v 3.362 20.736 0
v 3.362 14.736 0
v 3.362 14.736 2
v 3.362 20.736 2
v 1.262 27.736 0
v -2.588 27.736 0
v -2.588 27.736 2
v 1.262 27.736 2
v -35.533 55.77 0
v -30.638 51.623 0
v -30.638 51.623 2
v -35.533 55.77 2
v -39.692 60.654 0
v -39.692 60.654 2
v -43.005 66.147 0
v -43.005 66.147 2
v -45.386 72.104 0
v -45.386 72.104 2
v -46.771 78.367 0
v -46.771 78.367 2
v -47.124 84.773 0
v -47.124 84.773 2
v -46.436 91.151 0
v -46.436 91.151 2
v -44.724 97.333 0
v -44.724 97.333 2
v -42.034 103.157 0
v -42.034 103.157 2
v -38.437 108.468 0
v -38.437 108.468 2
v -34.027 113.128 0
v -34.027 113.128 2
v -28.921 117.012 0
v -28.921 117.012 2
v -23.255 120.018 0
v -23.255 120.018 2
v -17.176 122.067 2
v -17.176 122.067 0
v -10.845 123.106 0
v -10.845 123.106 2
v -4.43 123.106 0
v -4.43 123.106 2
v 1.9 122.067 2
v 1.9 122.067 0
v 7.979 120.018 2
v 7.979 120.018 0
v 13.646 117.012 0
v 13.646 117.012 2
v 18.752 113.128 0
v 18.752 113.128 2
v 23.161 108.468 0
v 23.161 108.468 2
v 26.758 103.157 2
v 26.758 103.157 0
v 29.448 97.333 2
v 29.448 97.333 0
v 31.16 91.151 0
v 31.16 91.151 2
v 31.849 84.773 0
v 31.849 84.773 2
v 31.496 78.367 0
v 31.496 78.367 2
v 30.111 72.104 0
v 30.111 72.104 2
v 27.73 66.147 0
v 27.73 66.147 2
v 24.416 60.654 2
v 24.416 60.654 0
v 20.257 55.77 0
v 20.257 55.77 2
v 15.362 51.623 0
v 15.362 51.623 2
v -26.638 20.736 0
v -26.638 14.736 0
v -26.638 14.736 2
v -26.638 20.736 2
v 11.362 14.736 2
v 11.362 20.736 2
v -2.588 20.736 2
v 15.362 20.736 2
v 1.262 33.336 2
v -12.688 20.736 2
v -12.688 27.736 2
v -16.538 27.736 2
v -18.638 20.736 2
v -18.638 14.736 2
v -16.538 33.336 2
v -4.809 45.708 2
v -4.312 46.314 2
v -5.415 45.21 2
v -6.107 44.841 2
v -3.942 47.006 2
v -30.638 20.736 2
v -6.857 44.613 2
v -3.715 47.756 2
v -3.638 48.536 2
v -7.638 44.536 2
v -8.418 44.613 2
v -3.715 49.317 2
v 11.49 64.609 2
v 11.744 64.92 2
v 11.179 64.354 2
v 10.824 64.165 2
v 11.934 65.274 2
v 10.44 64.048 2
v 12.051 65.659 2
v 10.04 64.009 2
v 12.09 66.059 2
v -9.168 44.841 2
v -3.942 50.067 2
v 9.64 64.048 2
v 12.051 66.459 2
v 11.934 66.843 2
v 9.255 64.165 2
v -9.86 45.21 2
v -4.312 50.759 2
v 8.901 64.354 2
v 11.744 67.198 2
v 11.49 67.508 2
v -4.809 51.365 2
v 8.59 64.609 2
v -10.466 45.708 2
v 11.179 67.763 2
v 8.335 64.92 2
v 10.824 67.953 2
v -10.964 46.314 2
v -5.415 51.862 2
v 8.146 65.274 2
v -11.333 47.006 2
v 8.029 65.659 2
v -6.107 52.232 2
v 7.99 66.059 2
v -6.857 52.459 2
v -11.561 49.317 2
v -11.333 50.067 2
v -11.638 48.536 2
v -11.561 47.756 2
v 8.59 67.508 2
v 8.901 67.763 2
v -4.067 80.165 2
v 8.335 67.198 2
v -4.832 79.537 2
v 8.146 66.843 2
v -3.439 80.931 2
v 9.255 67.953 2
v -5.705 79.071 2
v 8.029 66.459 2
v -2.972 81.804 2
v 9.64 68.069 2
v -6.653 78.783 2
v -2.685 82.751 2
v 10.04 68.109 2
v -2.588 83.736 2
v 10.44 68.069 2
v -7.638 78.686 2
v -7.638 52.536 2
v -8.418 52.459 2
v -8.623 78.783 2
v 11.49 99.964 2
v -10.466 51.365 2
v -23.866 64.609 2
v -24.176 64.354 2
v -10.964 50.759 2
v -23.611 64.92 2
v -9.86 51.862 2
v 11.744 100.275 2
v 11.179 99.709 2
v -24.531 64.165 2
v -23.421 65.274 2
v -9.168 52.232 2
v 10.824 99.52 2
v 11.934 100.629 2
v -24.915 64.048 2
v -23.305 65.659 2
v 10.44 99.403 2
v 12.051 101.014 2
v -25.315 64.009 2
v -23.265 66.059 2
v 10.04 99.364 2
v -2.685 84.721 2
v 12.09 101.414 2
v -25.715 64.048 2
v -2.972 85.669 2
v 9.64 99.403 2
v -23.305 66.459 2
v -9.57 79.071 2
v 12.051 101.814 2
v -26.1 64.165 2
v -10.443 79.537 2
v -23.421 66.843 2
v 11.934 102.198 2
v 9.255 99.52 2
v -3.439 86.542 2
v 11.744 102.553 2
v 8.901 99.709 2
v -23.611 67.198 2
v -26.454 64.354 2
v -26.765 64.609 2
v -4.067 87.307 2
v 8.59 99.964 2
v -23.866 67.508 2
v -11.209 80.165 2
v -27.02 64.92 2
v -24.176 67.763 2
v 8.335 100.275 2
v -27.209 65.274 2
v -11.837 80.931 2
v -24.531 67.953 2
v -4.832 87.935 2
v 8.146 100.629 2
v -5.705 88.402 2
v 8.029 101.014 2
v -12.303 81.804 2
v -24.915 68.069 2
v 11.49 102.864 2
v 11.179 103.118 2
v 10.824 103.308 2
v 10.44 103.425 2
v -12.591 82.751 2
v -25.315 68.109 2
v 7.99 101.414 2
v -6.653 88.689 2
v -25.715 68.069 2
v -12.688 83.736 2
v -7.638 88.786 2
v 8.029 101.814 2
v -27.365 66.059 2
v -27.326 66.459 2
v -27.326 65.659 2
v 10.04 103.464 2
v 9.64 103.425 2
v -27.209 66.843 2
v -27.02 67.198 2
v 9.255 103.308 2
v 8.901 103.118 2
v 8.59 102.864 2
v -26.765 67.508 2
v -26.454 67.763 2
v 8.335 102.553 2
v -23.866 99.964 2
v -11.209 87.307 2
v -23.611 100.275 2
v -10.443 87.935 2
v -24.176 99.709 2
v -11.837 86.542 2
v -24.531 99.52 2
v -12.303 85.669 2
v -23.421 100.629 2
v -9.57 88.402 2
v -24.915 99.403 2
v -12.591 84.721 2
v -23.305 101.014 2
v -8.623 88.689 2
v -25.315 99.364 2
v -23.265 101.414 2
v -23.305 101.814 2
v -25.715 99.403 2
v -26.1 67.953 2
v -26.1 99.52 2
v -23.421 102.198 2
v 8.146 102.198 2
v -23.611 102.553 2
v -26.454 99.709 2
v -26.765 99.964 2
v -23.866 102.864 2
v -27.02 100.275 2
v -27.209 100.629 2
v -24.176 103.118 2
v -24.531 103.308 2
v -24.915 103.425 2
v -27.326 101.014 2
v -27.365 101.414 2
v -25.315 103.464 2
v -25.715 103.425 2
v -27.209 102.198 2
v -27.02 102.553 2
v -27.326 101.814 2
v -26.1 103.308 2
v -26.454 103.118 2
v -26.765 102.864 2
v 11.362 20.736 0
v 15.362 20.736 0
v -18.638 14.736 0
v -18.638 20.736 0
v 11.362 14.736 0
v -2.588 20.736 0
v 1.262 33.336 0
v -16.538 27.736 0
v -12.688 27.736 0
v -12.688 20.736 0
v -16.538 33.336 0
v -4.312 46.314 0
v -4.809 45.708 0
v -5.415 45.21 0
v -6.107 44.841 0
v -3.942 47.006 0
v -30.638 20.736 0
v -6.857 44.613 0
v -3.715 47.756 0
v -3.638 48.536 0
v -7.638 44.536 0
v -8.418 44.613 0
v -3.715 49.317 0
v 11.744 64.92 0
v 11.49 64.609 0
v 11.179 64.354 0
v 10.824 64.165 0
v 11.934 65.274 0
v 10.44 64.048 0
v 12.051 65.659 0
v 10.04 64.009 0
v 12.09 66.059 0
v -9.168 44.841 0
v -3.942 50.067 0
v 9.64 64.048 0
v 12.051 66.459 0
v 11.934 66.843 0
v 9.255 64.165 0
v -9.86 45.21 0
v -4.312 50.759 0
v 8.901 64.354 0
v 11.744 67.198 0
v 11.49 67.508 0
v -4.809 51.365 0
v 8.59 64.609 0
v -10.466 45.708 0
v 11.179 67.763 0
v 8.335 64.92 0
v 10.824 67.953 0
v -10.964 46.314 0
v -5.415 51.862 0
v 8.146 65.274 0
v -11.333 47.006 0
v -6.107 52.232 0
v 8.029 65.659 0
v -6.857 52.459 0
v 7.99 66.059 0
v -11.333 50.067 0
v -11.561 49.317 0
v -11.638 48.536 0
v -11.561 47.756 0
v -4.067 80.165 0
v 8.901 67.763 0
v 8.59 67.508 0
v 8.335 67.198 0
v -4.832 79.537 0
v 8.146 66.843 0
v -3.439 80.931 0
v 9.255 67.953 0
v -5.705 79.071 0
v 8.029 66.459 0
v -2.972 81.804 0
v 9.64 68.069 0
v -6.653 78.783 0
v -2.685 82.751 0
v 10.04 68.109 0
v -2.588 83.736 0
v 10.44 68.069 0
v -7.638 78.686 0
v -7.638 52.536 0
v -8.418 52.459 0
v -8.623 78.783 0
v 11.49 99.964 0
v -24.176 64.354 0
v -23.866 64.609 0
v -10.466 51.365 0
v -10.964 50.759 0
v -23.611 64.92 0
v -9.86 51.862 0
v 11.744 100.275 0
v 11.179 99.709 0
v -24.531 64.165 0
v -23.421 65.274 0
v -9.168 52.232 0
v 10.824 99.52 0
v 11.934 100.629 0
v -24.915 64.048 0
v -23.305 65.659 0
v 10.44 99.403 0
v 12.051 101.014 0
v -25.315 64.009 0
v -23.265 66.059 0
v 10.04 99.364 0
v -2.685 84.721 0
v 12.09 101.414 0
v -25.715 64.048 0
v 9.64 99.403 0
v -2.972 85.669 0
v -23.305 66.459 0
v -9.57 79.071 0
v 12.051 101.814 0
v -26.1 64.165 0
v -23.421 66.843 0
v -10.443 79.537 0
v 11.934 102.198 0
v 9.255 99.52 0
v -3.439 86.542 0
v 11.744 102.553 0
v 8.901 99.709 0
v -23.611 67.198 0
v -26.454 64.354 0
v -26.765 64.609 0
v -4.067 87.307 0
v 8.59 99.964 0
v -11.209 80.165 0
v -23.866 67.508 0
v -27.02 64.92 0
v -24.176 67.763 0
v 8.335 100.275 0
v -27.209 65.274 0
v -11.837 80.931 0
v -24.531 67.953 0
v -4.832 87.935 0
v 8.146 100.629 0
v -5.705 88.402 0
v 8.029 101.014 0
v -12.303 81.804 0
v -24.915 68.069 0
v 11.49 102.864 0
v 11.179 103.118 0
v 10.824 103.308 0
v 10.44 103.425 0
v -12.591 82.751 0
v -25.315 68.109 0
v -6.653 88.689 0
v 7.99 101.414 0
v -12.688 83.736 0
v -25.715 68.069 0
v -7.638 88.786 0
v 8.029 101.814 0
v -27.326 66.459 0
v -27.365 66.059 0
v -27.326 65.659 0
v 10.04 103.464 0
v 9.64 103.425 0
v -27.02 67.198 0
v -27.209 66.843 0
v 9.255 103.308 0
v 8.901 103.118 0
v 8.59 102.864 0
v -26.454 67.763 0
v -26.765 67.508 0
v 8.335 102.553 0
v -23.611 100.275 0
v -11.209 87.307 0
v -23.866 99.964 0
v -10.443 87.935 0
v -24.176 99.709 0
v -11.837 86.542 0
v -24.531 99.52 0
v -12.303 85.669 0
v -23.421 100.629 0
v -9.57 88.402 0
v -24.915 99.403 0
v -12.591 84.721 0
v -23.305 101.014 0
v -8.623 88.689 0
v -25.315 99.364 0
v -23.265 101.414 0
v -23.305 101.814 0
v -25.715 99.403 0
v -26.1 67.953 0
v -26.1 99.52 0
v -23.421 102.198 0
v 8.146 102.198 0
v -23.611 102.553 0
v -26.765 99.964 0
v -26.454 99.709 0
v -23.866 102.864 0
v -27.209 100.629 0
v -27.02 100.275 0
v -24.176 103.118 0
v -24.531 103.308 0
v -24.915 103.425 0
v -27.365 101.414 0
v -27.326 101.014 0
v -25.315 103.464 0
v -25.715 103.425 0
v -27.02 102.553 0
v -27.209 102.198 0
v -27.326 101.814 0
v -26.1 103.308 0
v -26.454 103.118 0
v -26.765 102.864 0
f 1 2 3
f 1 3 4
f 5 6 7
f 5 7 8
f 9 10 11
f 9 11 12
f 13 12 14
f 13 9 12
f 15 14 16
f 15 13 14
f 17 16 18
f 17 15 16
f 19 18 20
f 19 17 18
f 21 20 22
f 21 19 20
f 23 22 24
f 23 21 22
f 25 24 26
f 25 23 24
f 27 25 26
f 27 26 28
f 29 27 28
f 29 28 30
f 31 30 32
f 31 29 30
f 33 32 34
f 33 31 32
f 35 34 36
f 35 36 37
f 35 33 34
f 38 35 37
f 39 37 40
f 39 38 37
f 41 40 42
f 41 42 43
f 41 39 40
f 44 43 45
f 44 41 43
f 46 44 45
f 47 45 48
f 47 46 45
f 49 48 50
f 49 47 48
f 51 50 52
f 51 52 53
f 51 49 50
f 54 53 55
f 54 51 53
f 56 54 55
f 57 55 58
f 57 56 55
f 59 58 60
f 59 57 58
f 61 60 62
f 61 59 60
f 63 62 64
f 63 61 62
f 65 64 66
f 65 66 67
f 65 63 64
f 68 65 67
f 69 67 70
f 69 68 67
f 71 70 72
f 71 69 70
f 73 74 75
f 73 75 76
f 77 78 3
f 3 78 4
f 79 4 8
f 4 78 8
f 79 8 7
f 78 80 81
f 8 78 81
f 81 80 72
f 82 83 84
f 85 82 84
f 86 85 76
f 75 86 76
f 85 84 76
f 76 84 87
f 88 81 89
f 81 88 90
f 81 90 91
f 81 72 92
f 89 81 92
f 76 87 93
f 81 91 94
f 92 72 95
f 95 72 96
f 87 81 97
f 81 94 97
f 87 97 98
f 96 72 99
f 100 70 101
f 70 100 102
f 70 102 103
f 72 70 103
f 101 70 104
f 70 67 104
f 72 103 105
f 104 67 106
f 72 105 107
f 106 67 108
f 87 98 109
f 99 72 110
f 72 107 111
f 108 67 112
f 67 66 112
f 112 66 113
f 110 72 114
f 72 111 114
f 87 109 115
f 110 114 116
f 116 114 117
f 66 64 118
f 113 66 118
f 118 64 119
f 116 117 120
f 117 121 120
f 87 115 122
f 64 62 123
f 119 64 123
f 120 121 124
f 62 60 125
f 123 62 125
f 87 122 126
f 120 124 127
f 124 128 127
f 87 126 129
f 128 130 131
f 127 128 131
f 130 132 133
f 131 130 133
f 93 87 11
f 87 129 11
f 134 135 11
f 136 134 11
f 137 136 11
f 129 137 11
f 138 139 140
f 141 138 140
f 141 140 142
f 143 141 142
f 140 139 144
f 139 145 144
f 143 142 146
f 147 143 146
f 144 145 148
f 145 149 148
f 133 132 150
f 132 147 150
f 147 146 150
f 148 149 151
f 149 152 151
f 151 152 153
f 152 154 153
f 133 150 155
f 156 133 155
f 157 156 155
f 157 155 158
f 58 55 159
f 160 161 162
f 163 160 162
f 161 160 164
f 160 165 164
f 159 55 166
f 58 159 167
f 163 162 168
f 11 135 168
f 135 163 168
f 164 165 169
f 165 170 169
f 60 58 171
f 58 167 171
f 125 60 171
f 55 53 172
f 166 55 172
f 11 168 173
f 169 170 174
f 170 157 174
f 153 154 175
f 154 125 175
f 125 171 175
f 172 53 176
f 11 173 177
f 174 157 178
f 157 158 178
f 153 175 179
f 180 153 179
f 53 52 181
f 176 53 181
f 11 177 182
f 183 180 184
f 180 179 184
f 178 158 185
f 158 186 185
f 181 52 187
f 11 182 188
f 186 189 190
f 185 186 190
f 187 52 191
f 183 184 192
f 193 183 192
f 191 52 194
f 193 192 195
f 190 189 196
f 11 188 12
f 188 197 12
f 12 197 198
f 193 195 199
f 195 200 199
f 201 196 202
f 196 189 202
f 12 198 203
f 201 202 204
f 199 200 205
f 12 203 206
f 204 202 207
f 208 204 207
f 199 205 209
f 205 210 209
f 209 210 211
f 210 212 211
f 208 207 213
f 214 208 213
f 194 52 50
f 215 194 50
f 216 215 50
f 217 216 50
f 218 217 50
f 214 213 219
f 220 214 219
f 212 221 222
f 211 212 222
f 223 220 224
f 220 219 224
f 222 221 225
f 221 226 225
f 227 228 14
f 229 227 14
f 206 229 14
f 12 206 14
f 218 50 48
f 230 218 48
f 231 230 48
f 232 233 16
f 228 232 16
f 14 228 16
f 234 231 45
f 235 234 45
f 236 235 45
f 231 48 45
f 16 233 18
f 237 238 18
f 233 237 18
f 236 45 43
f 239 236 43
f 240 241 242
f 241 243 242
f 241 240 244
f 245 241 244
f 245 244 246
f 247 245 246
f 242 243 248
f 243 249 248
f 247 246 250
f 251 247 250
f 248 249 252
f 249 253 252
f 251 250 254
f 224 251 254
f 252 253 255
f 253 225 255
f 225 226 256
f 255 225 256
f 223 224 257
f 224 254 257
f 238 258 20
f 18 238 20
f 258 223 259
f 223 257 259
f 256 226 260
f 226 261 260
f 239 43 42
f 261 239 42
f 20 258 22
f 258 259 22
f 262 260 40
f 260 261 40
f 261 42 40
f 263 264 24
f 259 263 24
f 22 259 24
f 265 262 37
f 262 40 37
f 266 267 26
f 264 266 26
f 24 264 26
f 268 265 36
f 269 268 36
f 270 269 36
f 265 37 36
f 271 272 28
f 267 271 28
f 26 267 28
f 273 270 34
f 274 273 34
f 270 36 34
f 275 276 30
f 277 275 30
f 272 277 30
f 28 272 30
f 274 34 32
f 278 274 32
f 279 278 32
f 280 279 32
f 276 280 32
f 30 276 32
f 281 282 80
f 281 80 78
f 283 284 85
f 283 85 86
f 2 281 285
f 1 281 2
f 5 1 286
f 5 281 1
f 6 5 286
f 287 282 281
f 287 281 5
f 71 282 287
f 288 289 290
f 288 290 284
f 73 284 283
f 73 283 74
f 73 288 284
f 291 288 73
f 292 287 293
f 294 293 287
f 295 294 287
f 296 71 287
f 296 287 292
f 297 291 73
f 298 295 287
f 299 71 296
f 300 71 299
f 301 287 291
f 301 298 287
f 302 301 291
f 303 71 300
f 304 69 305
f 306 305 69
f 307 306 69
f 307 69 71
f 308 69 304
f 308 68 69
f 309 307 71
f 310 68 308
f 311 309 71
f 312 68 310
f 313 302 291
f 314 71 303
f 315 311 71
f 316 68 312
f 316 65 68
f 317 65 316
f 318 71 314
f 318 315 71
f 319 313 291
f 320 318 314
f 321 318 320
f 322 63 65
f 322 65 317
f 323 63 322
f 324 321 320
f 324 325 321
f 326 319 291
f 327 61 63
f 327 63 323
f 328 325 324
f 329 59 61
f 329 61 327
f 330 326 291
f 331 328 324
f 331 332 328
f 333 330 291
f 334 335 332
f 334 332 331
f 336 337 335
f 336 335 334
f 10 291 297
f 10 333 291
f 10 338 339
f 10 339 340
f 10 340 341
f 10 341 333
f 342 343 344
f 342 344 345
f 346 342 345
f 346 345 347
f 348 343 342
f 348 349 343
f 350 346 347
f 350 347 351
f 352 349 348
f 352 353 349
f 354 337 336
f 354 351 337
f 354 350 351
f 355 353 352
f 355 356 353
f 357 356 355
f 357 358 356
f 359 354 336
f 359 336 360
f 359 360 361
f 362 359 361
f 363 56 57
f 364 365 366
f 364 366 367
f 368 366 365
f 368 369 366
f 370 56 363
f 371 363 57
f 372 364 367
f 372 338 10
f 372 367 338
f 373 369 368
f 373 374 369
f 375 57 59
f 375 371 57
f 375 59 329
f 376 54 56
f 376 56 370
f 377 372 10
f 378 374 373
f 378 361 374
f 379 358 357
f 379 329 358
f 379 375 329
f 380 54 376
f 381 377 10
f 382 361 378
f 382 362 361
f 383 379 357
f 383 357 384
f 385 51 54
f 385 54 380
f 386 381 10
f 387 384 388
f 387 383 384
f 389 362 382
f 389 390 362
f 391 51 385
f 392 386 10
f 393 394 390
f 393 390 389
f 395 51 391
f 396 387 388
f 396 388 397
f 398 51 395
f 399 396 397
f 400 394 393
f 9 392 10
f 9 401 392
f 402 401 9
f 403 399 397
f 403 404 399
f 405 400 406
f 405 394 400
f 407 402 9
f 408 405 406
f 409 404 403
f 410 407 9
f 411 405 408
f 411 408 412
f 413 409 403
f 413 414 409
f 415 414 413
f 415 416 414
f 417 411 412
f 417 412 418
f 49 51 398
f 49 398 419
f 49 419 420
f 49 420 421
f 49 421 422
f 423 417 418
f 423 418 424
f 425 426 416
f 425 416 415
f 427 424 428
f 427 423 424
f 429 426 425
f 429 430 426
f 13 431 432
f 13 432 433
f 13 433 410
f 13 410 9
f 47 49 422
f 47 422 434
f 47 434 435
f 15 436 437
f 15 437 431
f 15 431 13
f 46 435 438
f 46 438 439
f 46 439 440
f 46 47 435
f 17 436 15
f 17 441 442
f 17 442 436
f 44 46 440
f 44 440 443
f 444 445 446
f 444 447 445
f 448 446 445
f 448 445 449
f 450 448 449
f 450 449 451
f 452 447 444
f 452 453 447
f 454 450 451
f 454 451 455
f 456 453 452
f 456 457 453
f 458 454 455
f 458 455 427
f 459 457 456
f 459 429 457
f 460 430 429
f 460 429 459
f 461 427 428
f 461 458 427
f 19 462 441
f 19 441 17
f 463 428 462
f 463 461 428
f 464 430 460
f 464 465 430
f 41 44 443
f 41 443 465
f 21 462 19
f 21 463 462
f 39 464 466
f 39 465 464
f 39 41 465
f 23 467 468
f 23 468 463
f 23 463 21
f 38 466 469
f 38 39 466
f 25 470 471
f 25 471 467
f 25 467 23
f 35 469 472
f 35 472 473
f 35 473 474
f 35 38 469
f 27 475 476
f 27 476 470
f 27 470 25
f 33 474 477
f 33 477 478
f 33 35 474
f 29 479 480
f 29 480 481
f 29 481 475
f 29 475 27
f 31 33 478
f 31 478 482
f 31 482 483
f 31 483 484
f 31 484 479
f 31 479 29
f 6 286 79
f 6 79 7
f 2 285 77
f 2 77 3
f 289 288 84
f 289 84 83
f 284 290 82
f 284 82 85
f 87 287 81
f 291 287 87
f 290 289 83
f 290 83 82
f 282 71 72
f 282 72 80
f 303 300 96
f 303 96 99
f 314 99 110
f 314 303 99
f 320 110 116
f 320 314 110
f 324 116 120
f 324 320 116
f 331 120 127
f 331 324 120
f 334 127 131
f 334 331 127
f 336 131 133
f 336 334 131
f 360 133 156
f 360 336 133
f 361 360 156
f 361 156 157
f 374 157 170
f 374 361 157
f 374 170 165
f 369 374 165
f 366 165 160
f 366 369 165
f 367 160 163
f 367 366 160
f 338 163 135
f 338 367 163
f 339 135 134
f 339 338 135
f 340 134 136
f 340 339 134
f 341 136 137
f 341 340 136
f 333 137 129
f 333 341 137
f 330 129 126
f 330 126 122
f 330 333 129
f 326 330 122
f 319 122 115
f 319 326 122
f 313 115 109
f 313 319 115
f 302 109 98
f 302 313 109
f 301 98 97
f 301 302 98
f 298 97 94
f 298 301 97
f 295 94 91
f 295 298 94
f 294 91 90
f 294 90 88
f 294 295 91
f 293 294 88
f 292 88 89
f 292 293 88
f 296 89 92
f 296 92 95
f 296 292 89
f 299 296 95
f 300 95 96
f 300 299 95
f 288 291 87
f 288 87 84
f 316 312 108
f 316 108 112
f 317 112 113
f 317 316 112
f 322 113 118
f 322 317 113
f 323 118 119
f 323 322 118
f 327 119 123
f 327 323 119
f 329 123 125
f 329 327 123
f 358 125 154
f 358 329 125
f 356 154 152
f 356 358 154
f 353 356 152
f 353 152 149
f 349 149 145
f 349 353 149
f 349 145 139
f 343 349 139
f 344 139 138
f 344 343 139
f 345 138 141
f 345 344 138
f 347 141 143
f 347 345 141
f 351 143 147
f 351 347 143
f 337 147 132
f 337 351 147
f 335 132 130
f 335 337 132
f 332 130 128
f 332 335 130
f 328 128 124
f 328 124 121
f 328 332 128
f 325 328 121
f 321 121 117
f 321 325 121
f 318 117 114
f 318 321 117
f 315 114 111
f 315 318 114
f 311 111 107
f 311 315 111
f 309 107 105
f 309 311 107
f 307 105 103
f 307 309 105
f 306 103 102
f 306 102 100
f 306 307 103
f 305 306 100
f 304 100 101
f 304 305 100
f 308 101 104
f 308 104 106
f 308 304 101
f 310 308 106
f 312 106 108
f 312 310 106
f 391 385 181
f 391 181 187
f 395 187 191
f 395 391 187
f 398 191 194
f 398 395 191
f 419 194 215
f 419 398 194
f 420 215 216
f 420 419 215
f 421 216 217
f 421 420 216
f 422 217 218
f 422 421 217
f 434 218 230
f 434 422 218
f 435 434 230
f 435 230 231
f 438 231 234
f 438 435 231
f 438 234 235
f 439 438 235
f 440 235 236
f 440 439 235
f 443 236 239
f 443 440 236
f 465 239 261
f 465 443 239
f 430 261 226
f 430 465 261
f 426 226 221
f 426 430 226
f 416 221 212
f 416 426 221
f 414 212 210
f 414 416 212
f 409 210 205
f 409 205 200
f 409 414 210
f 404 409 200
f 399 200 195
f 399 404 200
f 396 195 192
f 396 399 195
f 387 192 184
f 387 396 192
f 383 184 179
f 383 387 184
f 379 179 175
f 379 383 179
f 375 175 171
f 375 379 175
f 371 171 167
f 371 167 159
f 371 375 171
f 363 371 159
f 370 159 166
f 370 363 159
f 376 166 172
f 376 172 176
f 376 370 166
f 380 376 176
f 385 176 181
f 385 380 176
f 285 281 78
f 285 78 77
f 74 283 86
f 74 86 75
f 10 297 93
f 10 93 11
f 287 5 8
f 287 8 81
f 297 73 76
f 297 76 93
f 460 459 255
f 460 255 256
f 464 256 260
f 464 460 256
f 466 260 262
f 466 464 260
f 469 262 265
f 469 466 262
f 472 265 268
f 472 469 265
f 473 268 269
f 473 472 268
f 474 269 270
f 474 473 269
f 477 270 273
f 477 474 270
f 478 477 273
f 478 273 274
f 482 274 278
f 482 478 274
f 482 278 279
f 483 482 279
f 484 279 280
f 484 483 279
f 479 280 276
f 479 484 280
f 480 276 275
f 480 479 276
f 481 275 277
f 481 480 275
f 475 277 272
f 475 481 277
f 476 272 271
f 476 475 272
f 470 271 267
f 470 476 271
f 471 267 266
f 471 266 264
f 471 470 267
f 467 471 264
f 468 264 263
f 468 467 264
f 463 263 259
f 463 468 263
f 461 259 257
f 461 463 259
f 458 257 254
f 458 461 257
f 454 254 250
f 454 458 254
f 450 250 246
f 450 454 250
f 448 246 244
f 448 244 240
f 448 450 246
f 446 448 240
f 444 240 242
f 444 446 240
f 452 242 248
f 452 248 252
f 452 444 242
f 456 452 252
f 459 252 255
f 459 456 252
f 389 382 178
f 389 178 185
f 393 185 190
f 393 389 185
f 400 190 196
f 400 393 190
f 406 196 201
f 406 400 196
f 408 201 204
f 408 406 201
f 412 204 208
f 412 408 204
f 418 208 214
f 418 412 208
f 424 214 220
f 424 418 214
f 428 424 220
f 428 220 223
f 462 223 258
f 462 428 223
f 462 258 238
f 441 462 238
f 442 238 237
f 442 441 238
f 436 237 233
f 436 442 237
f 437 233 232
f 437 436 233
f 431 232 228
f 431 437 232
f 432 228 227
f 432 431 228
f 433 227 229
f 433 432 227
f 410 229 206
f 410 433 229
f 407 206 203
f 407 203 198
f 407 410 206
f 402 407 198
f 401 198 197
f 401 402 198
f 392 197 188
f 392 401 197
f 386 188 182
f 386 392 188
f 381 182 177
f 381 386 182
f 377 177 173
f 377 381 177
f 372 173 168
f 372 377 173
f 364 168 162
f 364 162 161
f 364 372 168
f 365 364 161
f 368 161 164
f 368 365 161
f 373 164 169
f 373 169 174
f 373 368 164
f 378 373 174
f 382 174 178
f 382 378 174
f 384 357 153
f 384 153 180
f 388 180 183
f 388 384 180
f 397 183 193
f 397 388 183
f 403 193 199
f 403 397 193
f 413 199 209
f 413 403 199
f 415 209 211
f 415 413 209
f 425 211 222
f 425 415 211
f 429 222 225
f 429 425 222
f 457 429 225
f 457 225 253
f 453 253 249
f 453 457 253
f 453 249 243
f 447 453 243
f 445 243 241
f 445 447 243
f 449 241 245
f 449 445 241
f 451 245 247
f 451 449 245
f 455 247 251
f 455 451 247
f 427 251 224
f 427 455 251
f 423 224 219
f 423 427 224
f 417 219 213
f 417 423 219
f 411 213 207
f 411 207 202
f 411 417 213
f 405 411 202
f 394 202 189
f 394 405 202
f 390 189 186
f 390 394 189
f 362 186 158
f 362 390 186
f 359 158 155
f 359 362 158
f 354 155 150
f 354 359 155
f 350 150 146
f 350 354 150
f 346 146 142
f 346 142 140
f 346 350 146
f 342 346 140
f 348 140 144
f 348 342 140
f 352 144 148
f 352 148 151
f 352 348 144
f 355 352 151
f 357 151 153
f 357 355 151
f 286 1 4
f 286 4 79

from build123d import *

# Parameters (mm, degrees)
SKETCH_1_R      = 5.05
SKETCH_1_R_2    = 2.05
SKETCH_1_R_3    = 4
EXTRUDE_1_DEPTH = 2


with BuildPart() as part:
    # 草图1 → 凸台-拉伸1 (new body)
    with BuildSketch(Plane.XY):
        with BuildLine():
            Line((-2.587732913, 20.736278596), (-2.587732913, 27.736278596))
            Line((-2.587732913, 27.736278596), (1.262267087, 27.736278596))
            Line((1.262267087, 27.736278596), (1.262267087, 33.336278596))
            Line((1.262267087, 33.336278596), (-2.687732913, 33.336278596))
            Line((-2.687732913, 33.336278596), (-12.587732913, 33.336278596))
            Line((-12.587732913, 33.336278596), (-16.537732913, 33.336278596))
            Line((-16.537732913, 33.336278596), (-16.537732913, 27.736278596))
            Line((-16.537732913, 27.736278596), (-12.687732913, 27.736278596))
            Line((-12.687732913, 27.736278596), (-12.687732913, 20.736278596))
            Line((-12.687732913, 20.736278596), (-18.637732913, 20.736278596))
            Line((-18.637732913, 20.736278596), (-18.637732913, 14.736278596))
            Line((-18.637732913, 14.736278596), (-26.637732913, 14.736278596))
            Line((-26.637732913, 14.736278596), (-26.637732913, 20.736278596))
            Line((-26.637732913, 20.736278596), (-30.637732913, 20.736278596))
            Line((-30.637732913, 20.736278596), (-30.637732913, 51.623197149))
            ThreePointArc((-30.637732913, 51.623197149), (-7.637732913, 123.236278596), (15.362267087, 51.623197149))
            Line((15.362267087, 51.623197149), (15.362267087, 20.736278596))
            Line((15.362267087, 20.736278596), (11.362267087, 20.736278596))
            Line((11.362267087, 20.736278596), (11.362267087, 14.736278596))
            Line((11.362267087, 14.736278596), (3.362267087, 14.736278596))
            Line((3.362267087, 14.736278596), (3.362267087, 20.736278596))
            Line((3.362267087, 20.736278596), (-2.587732913, 20.736278596))
        make_face()
        with Locations((-7.637732913, 83.736278596)):
            Circle(SKETCH_1_R, mode=Mode.SUBTRACT)
        with Locations((10.039936617, 66.058609066)):
            Circle(SKETCH_1_R_2, mode=Mode.SUBTRACT)
        with Locations((-25.315402443, 66.058609066)):
            Circle(SKETCH_1_R_2, mode=Mode.SUBTRACT)
        with Locations((-25.315402443, 101.413948126)):
            Circle(SKETCH_1_R_2, mode=Mode.SUBTRACT)
        with Locations((10.039936617, 101.413948126)):
            Circle(SKETCH_1_R_2, mode=Mode.SUBTRACT)
        with Locations((-7.637732913, 48.536278596)):
            Circle(SKETCH_1_R_3, mode=Mode.SUBTRACT)
    extrude(amount=EXTRUDE_1_DEPTH)


solid = part.part
